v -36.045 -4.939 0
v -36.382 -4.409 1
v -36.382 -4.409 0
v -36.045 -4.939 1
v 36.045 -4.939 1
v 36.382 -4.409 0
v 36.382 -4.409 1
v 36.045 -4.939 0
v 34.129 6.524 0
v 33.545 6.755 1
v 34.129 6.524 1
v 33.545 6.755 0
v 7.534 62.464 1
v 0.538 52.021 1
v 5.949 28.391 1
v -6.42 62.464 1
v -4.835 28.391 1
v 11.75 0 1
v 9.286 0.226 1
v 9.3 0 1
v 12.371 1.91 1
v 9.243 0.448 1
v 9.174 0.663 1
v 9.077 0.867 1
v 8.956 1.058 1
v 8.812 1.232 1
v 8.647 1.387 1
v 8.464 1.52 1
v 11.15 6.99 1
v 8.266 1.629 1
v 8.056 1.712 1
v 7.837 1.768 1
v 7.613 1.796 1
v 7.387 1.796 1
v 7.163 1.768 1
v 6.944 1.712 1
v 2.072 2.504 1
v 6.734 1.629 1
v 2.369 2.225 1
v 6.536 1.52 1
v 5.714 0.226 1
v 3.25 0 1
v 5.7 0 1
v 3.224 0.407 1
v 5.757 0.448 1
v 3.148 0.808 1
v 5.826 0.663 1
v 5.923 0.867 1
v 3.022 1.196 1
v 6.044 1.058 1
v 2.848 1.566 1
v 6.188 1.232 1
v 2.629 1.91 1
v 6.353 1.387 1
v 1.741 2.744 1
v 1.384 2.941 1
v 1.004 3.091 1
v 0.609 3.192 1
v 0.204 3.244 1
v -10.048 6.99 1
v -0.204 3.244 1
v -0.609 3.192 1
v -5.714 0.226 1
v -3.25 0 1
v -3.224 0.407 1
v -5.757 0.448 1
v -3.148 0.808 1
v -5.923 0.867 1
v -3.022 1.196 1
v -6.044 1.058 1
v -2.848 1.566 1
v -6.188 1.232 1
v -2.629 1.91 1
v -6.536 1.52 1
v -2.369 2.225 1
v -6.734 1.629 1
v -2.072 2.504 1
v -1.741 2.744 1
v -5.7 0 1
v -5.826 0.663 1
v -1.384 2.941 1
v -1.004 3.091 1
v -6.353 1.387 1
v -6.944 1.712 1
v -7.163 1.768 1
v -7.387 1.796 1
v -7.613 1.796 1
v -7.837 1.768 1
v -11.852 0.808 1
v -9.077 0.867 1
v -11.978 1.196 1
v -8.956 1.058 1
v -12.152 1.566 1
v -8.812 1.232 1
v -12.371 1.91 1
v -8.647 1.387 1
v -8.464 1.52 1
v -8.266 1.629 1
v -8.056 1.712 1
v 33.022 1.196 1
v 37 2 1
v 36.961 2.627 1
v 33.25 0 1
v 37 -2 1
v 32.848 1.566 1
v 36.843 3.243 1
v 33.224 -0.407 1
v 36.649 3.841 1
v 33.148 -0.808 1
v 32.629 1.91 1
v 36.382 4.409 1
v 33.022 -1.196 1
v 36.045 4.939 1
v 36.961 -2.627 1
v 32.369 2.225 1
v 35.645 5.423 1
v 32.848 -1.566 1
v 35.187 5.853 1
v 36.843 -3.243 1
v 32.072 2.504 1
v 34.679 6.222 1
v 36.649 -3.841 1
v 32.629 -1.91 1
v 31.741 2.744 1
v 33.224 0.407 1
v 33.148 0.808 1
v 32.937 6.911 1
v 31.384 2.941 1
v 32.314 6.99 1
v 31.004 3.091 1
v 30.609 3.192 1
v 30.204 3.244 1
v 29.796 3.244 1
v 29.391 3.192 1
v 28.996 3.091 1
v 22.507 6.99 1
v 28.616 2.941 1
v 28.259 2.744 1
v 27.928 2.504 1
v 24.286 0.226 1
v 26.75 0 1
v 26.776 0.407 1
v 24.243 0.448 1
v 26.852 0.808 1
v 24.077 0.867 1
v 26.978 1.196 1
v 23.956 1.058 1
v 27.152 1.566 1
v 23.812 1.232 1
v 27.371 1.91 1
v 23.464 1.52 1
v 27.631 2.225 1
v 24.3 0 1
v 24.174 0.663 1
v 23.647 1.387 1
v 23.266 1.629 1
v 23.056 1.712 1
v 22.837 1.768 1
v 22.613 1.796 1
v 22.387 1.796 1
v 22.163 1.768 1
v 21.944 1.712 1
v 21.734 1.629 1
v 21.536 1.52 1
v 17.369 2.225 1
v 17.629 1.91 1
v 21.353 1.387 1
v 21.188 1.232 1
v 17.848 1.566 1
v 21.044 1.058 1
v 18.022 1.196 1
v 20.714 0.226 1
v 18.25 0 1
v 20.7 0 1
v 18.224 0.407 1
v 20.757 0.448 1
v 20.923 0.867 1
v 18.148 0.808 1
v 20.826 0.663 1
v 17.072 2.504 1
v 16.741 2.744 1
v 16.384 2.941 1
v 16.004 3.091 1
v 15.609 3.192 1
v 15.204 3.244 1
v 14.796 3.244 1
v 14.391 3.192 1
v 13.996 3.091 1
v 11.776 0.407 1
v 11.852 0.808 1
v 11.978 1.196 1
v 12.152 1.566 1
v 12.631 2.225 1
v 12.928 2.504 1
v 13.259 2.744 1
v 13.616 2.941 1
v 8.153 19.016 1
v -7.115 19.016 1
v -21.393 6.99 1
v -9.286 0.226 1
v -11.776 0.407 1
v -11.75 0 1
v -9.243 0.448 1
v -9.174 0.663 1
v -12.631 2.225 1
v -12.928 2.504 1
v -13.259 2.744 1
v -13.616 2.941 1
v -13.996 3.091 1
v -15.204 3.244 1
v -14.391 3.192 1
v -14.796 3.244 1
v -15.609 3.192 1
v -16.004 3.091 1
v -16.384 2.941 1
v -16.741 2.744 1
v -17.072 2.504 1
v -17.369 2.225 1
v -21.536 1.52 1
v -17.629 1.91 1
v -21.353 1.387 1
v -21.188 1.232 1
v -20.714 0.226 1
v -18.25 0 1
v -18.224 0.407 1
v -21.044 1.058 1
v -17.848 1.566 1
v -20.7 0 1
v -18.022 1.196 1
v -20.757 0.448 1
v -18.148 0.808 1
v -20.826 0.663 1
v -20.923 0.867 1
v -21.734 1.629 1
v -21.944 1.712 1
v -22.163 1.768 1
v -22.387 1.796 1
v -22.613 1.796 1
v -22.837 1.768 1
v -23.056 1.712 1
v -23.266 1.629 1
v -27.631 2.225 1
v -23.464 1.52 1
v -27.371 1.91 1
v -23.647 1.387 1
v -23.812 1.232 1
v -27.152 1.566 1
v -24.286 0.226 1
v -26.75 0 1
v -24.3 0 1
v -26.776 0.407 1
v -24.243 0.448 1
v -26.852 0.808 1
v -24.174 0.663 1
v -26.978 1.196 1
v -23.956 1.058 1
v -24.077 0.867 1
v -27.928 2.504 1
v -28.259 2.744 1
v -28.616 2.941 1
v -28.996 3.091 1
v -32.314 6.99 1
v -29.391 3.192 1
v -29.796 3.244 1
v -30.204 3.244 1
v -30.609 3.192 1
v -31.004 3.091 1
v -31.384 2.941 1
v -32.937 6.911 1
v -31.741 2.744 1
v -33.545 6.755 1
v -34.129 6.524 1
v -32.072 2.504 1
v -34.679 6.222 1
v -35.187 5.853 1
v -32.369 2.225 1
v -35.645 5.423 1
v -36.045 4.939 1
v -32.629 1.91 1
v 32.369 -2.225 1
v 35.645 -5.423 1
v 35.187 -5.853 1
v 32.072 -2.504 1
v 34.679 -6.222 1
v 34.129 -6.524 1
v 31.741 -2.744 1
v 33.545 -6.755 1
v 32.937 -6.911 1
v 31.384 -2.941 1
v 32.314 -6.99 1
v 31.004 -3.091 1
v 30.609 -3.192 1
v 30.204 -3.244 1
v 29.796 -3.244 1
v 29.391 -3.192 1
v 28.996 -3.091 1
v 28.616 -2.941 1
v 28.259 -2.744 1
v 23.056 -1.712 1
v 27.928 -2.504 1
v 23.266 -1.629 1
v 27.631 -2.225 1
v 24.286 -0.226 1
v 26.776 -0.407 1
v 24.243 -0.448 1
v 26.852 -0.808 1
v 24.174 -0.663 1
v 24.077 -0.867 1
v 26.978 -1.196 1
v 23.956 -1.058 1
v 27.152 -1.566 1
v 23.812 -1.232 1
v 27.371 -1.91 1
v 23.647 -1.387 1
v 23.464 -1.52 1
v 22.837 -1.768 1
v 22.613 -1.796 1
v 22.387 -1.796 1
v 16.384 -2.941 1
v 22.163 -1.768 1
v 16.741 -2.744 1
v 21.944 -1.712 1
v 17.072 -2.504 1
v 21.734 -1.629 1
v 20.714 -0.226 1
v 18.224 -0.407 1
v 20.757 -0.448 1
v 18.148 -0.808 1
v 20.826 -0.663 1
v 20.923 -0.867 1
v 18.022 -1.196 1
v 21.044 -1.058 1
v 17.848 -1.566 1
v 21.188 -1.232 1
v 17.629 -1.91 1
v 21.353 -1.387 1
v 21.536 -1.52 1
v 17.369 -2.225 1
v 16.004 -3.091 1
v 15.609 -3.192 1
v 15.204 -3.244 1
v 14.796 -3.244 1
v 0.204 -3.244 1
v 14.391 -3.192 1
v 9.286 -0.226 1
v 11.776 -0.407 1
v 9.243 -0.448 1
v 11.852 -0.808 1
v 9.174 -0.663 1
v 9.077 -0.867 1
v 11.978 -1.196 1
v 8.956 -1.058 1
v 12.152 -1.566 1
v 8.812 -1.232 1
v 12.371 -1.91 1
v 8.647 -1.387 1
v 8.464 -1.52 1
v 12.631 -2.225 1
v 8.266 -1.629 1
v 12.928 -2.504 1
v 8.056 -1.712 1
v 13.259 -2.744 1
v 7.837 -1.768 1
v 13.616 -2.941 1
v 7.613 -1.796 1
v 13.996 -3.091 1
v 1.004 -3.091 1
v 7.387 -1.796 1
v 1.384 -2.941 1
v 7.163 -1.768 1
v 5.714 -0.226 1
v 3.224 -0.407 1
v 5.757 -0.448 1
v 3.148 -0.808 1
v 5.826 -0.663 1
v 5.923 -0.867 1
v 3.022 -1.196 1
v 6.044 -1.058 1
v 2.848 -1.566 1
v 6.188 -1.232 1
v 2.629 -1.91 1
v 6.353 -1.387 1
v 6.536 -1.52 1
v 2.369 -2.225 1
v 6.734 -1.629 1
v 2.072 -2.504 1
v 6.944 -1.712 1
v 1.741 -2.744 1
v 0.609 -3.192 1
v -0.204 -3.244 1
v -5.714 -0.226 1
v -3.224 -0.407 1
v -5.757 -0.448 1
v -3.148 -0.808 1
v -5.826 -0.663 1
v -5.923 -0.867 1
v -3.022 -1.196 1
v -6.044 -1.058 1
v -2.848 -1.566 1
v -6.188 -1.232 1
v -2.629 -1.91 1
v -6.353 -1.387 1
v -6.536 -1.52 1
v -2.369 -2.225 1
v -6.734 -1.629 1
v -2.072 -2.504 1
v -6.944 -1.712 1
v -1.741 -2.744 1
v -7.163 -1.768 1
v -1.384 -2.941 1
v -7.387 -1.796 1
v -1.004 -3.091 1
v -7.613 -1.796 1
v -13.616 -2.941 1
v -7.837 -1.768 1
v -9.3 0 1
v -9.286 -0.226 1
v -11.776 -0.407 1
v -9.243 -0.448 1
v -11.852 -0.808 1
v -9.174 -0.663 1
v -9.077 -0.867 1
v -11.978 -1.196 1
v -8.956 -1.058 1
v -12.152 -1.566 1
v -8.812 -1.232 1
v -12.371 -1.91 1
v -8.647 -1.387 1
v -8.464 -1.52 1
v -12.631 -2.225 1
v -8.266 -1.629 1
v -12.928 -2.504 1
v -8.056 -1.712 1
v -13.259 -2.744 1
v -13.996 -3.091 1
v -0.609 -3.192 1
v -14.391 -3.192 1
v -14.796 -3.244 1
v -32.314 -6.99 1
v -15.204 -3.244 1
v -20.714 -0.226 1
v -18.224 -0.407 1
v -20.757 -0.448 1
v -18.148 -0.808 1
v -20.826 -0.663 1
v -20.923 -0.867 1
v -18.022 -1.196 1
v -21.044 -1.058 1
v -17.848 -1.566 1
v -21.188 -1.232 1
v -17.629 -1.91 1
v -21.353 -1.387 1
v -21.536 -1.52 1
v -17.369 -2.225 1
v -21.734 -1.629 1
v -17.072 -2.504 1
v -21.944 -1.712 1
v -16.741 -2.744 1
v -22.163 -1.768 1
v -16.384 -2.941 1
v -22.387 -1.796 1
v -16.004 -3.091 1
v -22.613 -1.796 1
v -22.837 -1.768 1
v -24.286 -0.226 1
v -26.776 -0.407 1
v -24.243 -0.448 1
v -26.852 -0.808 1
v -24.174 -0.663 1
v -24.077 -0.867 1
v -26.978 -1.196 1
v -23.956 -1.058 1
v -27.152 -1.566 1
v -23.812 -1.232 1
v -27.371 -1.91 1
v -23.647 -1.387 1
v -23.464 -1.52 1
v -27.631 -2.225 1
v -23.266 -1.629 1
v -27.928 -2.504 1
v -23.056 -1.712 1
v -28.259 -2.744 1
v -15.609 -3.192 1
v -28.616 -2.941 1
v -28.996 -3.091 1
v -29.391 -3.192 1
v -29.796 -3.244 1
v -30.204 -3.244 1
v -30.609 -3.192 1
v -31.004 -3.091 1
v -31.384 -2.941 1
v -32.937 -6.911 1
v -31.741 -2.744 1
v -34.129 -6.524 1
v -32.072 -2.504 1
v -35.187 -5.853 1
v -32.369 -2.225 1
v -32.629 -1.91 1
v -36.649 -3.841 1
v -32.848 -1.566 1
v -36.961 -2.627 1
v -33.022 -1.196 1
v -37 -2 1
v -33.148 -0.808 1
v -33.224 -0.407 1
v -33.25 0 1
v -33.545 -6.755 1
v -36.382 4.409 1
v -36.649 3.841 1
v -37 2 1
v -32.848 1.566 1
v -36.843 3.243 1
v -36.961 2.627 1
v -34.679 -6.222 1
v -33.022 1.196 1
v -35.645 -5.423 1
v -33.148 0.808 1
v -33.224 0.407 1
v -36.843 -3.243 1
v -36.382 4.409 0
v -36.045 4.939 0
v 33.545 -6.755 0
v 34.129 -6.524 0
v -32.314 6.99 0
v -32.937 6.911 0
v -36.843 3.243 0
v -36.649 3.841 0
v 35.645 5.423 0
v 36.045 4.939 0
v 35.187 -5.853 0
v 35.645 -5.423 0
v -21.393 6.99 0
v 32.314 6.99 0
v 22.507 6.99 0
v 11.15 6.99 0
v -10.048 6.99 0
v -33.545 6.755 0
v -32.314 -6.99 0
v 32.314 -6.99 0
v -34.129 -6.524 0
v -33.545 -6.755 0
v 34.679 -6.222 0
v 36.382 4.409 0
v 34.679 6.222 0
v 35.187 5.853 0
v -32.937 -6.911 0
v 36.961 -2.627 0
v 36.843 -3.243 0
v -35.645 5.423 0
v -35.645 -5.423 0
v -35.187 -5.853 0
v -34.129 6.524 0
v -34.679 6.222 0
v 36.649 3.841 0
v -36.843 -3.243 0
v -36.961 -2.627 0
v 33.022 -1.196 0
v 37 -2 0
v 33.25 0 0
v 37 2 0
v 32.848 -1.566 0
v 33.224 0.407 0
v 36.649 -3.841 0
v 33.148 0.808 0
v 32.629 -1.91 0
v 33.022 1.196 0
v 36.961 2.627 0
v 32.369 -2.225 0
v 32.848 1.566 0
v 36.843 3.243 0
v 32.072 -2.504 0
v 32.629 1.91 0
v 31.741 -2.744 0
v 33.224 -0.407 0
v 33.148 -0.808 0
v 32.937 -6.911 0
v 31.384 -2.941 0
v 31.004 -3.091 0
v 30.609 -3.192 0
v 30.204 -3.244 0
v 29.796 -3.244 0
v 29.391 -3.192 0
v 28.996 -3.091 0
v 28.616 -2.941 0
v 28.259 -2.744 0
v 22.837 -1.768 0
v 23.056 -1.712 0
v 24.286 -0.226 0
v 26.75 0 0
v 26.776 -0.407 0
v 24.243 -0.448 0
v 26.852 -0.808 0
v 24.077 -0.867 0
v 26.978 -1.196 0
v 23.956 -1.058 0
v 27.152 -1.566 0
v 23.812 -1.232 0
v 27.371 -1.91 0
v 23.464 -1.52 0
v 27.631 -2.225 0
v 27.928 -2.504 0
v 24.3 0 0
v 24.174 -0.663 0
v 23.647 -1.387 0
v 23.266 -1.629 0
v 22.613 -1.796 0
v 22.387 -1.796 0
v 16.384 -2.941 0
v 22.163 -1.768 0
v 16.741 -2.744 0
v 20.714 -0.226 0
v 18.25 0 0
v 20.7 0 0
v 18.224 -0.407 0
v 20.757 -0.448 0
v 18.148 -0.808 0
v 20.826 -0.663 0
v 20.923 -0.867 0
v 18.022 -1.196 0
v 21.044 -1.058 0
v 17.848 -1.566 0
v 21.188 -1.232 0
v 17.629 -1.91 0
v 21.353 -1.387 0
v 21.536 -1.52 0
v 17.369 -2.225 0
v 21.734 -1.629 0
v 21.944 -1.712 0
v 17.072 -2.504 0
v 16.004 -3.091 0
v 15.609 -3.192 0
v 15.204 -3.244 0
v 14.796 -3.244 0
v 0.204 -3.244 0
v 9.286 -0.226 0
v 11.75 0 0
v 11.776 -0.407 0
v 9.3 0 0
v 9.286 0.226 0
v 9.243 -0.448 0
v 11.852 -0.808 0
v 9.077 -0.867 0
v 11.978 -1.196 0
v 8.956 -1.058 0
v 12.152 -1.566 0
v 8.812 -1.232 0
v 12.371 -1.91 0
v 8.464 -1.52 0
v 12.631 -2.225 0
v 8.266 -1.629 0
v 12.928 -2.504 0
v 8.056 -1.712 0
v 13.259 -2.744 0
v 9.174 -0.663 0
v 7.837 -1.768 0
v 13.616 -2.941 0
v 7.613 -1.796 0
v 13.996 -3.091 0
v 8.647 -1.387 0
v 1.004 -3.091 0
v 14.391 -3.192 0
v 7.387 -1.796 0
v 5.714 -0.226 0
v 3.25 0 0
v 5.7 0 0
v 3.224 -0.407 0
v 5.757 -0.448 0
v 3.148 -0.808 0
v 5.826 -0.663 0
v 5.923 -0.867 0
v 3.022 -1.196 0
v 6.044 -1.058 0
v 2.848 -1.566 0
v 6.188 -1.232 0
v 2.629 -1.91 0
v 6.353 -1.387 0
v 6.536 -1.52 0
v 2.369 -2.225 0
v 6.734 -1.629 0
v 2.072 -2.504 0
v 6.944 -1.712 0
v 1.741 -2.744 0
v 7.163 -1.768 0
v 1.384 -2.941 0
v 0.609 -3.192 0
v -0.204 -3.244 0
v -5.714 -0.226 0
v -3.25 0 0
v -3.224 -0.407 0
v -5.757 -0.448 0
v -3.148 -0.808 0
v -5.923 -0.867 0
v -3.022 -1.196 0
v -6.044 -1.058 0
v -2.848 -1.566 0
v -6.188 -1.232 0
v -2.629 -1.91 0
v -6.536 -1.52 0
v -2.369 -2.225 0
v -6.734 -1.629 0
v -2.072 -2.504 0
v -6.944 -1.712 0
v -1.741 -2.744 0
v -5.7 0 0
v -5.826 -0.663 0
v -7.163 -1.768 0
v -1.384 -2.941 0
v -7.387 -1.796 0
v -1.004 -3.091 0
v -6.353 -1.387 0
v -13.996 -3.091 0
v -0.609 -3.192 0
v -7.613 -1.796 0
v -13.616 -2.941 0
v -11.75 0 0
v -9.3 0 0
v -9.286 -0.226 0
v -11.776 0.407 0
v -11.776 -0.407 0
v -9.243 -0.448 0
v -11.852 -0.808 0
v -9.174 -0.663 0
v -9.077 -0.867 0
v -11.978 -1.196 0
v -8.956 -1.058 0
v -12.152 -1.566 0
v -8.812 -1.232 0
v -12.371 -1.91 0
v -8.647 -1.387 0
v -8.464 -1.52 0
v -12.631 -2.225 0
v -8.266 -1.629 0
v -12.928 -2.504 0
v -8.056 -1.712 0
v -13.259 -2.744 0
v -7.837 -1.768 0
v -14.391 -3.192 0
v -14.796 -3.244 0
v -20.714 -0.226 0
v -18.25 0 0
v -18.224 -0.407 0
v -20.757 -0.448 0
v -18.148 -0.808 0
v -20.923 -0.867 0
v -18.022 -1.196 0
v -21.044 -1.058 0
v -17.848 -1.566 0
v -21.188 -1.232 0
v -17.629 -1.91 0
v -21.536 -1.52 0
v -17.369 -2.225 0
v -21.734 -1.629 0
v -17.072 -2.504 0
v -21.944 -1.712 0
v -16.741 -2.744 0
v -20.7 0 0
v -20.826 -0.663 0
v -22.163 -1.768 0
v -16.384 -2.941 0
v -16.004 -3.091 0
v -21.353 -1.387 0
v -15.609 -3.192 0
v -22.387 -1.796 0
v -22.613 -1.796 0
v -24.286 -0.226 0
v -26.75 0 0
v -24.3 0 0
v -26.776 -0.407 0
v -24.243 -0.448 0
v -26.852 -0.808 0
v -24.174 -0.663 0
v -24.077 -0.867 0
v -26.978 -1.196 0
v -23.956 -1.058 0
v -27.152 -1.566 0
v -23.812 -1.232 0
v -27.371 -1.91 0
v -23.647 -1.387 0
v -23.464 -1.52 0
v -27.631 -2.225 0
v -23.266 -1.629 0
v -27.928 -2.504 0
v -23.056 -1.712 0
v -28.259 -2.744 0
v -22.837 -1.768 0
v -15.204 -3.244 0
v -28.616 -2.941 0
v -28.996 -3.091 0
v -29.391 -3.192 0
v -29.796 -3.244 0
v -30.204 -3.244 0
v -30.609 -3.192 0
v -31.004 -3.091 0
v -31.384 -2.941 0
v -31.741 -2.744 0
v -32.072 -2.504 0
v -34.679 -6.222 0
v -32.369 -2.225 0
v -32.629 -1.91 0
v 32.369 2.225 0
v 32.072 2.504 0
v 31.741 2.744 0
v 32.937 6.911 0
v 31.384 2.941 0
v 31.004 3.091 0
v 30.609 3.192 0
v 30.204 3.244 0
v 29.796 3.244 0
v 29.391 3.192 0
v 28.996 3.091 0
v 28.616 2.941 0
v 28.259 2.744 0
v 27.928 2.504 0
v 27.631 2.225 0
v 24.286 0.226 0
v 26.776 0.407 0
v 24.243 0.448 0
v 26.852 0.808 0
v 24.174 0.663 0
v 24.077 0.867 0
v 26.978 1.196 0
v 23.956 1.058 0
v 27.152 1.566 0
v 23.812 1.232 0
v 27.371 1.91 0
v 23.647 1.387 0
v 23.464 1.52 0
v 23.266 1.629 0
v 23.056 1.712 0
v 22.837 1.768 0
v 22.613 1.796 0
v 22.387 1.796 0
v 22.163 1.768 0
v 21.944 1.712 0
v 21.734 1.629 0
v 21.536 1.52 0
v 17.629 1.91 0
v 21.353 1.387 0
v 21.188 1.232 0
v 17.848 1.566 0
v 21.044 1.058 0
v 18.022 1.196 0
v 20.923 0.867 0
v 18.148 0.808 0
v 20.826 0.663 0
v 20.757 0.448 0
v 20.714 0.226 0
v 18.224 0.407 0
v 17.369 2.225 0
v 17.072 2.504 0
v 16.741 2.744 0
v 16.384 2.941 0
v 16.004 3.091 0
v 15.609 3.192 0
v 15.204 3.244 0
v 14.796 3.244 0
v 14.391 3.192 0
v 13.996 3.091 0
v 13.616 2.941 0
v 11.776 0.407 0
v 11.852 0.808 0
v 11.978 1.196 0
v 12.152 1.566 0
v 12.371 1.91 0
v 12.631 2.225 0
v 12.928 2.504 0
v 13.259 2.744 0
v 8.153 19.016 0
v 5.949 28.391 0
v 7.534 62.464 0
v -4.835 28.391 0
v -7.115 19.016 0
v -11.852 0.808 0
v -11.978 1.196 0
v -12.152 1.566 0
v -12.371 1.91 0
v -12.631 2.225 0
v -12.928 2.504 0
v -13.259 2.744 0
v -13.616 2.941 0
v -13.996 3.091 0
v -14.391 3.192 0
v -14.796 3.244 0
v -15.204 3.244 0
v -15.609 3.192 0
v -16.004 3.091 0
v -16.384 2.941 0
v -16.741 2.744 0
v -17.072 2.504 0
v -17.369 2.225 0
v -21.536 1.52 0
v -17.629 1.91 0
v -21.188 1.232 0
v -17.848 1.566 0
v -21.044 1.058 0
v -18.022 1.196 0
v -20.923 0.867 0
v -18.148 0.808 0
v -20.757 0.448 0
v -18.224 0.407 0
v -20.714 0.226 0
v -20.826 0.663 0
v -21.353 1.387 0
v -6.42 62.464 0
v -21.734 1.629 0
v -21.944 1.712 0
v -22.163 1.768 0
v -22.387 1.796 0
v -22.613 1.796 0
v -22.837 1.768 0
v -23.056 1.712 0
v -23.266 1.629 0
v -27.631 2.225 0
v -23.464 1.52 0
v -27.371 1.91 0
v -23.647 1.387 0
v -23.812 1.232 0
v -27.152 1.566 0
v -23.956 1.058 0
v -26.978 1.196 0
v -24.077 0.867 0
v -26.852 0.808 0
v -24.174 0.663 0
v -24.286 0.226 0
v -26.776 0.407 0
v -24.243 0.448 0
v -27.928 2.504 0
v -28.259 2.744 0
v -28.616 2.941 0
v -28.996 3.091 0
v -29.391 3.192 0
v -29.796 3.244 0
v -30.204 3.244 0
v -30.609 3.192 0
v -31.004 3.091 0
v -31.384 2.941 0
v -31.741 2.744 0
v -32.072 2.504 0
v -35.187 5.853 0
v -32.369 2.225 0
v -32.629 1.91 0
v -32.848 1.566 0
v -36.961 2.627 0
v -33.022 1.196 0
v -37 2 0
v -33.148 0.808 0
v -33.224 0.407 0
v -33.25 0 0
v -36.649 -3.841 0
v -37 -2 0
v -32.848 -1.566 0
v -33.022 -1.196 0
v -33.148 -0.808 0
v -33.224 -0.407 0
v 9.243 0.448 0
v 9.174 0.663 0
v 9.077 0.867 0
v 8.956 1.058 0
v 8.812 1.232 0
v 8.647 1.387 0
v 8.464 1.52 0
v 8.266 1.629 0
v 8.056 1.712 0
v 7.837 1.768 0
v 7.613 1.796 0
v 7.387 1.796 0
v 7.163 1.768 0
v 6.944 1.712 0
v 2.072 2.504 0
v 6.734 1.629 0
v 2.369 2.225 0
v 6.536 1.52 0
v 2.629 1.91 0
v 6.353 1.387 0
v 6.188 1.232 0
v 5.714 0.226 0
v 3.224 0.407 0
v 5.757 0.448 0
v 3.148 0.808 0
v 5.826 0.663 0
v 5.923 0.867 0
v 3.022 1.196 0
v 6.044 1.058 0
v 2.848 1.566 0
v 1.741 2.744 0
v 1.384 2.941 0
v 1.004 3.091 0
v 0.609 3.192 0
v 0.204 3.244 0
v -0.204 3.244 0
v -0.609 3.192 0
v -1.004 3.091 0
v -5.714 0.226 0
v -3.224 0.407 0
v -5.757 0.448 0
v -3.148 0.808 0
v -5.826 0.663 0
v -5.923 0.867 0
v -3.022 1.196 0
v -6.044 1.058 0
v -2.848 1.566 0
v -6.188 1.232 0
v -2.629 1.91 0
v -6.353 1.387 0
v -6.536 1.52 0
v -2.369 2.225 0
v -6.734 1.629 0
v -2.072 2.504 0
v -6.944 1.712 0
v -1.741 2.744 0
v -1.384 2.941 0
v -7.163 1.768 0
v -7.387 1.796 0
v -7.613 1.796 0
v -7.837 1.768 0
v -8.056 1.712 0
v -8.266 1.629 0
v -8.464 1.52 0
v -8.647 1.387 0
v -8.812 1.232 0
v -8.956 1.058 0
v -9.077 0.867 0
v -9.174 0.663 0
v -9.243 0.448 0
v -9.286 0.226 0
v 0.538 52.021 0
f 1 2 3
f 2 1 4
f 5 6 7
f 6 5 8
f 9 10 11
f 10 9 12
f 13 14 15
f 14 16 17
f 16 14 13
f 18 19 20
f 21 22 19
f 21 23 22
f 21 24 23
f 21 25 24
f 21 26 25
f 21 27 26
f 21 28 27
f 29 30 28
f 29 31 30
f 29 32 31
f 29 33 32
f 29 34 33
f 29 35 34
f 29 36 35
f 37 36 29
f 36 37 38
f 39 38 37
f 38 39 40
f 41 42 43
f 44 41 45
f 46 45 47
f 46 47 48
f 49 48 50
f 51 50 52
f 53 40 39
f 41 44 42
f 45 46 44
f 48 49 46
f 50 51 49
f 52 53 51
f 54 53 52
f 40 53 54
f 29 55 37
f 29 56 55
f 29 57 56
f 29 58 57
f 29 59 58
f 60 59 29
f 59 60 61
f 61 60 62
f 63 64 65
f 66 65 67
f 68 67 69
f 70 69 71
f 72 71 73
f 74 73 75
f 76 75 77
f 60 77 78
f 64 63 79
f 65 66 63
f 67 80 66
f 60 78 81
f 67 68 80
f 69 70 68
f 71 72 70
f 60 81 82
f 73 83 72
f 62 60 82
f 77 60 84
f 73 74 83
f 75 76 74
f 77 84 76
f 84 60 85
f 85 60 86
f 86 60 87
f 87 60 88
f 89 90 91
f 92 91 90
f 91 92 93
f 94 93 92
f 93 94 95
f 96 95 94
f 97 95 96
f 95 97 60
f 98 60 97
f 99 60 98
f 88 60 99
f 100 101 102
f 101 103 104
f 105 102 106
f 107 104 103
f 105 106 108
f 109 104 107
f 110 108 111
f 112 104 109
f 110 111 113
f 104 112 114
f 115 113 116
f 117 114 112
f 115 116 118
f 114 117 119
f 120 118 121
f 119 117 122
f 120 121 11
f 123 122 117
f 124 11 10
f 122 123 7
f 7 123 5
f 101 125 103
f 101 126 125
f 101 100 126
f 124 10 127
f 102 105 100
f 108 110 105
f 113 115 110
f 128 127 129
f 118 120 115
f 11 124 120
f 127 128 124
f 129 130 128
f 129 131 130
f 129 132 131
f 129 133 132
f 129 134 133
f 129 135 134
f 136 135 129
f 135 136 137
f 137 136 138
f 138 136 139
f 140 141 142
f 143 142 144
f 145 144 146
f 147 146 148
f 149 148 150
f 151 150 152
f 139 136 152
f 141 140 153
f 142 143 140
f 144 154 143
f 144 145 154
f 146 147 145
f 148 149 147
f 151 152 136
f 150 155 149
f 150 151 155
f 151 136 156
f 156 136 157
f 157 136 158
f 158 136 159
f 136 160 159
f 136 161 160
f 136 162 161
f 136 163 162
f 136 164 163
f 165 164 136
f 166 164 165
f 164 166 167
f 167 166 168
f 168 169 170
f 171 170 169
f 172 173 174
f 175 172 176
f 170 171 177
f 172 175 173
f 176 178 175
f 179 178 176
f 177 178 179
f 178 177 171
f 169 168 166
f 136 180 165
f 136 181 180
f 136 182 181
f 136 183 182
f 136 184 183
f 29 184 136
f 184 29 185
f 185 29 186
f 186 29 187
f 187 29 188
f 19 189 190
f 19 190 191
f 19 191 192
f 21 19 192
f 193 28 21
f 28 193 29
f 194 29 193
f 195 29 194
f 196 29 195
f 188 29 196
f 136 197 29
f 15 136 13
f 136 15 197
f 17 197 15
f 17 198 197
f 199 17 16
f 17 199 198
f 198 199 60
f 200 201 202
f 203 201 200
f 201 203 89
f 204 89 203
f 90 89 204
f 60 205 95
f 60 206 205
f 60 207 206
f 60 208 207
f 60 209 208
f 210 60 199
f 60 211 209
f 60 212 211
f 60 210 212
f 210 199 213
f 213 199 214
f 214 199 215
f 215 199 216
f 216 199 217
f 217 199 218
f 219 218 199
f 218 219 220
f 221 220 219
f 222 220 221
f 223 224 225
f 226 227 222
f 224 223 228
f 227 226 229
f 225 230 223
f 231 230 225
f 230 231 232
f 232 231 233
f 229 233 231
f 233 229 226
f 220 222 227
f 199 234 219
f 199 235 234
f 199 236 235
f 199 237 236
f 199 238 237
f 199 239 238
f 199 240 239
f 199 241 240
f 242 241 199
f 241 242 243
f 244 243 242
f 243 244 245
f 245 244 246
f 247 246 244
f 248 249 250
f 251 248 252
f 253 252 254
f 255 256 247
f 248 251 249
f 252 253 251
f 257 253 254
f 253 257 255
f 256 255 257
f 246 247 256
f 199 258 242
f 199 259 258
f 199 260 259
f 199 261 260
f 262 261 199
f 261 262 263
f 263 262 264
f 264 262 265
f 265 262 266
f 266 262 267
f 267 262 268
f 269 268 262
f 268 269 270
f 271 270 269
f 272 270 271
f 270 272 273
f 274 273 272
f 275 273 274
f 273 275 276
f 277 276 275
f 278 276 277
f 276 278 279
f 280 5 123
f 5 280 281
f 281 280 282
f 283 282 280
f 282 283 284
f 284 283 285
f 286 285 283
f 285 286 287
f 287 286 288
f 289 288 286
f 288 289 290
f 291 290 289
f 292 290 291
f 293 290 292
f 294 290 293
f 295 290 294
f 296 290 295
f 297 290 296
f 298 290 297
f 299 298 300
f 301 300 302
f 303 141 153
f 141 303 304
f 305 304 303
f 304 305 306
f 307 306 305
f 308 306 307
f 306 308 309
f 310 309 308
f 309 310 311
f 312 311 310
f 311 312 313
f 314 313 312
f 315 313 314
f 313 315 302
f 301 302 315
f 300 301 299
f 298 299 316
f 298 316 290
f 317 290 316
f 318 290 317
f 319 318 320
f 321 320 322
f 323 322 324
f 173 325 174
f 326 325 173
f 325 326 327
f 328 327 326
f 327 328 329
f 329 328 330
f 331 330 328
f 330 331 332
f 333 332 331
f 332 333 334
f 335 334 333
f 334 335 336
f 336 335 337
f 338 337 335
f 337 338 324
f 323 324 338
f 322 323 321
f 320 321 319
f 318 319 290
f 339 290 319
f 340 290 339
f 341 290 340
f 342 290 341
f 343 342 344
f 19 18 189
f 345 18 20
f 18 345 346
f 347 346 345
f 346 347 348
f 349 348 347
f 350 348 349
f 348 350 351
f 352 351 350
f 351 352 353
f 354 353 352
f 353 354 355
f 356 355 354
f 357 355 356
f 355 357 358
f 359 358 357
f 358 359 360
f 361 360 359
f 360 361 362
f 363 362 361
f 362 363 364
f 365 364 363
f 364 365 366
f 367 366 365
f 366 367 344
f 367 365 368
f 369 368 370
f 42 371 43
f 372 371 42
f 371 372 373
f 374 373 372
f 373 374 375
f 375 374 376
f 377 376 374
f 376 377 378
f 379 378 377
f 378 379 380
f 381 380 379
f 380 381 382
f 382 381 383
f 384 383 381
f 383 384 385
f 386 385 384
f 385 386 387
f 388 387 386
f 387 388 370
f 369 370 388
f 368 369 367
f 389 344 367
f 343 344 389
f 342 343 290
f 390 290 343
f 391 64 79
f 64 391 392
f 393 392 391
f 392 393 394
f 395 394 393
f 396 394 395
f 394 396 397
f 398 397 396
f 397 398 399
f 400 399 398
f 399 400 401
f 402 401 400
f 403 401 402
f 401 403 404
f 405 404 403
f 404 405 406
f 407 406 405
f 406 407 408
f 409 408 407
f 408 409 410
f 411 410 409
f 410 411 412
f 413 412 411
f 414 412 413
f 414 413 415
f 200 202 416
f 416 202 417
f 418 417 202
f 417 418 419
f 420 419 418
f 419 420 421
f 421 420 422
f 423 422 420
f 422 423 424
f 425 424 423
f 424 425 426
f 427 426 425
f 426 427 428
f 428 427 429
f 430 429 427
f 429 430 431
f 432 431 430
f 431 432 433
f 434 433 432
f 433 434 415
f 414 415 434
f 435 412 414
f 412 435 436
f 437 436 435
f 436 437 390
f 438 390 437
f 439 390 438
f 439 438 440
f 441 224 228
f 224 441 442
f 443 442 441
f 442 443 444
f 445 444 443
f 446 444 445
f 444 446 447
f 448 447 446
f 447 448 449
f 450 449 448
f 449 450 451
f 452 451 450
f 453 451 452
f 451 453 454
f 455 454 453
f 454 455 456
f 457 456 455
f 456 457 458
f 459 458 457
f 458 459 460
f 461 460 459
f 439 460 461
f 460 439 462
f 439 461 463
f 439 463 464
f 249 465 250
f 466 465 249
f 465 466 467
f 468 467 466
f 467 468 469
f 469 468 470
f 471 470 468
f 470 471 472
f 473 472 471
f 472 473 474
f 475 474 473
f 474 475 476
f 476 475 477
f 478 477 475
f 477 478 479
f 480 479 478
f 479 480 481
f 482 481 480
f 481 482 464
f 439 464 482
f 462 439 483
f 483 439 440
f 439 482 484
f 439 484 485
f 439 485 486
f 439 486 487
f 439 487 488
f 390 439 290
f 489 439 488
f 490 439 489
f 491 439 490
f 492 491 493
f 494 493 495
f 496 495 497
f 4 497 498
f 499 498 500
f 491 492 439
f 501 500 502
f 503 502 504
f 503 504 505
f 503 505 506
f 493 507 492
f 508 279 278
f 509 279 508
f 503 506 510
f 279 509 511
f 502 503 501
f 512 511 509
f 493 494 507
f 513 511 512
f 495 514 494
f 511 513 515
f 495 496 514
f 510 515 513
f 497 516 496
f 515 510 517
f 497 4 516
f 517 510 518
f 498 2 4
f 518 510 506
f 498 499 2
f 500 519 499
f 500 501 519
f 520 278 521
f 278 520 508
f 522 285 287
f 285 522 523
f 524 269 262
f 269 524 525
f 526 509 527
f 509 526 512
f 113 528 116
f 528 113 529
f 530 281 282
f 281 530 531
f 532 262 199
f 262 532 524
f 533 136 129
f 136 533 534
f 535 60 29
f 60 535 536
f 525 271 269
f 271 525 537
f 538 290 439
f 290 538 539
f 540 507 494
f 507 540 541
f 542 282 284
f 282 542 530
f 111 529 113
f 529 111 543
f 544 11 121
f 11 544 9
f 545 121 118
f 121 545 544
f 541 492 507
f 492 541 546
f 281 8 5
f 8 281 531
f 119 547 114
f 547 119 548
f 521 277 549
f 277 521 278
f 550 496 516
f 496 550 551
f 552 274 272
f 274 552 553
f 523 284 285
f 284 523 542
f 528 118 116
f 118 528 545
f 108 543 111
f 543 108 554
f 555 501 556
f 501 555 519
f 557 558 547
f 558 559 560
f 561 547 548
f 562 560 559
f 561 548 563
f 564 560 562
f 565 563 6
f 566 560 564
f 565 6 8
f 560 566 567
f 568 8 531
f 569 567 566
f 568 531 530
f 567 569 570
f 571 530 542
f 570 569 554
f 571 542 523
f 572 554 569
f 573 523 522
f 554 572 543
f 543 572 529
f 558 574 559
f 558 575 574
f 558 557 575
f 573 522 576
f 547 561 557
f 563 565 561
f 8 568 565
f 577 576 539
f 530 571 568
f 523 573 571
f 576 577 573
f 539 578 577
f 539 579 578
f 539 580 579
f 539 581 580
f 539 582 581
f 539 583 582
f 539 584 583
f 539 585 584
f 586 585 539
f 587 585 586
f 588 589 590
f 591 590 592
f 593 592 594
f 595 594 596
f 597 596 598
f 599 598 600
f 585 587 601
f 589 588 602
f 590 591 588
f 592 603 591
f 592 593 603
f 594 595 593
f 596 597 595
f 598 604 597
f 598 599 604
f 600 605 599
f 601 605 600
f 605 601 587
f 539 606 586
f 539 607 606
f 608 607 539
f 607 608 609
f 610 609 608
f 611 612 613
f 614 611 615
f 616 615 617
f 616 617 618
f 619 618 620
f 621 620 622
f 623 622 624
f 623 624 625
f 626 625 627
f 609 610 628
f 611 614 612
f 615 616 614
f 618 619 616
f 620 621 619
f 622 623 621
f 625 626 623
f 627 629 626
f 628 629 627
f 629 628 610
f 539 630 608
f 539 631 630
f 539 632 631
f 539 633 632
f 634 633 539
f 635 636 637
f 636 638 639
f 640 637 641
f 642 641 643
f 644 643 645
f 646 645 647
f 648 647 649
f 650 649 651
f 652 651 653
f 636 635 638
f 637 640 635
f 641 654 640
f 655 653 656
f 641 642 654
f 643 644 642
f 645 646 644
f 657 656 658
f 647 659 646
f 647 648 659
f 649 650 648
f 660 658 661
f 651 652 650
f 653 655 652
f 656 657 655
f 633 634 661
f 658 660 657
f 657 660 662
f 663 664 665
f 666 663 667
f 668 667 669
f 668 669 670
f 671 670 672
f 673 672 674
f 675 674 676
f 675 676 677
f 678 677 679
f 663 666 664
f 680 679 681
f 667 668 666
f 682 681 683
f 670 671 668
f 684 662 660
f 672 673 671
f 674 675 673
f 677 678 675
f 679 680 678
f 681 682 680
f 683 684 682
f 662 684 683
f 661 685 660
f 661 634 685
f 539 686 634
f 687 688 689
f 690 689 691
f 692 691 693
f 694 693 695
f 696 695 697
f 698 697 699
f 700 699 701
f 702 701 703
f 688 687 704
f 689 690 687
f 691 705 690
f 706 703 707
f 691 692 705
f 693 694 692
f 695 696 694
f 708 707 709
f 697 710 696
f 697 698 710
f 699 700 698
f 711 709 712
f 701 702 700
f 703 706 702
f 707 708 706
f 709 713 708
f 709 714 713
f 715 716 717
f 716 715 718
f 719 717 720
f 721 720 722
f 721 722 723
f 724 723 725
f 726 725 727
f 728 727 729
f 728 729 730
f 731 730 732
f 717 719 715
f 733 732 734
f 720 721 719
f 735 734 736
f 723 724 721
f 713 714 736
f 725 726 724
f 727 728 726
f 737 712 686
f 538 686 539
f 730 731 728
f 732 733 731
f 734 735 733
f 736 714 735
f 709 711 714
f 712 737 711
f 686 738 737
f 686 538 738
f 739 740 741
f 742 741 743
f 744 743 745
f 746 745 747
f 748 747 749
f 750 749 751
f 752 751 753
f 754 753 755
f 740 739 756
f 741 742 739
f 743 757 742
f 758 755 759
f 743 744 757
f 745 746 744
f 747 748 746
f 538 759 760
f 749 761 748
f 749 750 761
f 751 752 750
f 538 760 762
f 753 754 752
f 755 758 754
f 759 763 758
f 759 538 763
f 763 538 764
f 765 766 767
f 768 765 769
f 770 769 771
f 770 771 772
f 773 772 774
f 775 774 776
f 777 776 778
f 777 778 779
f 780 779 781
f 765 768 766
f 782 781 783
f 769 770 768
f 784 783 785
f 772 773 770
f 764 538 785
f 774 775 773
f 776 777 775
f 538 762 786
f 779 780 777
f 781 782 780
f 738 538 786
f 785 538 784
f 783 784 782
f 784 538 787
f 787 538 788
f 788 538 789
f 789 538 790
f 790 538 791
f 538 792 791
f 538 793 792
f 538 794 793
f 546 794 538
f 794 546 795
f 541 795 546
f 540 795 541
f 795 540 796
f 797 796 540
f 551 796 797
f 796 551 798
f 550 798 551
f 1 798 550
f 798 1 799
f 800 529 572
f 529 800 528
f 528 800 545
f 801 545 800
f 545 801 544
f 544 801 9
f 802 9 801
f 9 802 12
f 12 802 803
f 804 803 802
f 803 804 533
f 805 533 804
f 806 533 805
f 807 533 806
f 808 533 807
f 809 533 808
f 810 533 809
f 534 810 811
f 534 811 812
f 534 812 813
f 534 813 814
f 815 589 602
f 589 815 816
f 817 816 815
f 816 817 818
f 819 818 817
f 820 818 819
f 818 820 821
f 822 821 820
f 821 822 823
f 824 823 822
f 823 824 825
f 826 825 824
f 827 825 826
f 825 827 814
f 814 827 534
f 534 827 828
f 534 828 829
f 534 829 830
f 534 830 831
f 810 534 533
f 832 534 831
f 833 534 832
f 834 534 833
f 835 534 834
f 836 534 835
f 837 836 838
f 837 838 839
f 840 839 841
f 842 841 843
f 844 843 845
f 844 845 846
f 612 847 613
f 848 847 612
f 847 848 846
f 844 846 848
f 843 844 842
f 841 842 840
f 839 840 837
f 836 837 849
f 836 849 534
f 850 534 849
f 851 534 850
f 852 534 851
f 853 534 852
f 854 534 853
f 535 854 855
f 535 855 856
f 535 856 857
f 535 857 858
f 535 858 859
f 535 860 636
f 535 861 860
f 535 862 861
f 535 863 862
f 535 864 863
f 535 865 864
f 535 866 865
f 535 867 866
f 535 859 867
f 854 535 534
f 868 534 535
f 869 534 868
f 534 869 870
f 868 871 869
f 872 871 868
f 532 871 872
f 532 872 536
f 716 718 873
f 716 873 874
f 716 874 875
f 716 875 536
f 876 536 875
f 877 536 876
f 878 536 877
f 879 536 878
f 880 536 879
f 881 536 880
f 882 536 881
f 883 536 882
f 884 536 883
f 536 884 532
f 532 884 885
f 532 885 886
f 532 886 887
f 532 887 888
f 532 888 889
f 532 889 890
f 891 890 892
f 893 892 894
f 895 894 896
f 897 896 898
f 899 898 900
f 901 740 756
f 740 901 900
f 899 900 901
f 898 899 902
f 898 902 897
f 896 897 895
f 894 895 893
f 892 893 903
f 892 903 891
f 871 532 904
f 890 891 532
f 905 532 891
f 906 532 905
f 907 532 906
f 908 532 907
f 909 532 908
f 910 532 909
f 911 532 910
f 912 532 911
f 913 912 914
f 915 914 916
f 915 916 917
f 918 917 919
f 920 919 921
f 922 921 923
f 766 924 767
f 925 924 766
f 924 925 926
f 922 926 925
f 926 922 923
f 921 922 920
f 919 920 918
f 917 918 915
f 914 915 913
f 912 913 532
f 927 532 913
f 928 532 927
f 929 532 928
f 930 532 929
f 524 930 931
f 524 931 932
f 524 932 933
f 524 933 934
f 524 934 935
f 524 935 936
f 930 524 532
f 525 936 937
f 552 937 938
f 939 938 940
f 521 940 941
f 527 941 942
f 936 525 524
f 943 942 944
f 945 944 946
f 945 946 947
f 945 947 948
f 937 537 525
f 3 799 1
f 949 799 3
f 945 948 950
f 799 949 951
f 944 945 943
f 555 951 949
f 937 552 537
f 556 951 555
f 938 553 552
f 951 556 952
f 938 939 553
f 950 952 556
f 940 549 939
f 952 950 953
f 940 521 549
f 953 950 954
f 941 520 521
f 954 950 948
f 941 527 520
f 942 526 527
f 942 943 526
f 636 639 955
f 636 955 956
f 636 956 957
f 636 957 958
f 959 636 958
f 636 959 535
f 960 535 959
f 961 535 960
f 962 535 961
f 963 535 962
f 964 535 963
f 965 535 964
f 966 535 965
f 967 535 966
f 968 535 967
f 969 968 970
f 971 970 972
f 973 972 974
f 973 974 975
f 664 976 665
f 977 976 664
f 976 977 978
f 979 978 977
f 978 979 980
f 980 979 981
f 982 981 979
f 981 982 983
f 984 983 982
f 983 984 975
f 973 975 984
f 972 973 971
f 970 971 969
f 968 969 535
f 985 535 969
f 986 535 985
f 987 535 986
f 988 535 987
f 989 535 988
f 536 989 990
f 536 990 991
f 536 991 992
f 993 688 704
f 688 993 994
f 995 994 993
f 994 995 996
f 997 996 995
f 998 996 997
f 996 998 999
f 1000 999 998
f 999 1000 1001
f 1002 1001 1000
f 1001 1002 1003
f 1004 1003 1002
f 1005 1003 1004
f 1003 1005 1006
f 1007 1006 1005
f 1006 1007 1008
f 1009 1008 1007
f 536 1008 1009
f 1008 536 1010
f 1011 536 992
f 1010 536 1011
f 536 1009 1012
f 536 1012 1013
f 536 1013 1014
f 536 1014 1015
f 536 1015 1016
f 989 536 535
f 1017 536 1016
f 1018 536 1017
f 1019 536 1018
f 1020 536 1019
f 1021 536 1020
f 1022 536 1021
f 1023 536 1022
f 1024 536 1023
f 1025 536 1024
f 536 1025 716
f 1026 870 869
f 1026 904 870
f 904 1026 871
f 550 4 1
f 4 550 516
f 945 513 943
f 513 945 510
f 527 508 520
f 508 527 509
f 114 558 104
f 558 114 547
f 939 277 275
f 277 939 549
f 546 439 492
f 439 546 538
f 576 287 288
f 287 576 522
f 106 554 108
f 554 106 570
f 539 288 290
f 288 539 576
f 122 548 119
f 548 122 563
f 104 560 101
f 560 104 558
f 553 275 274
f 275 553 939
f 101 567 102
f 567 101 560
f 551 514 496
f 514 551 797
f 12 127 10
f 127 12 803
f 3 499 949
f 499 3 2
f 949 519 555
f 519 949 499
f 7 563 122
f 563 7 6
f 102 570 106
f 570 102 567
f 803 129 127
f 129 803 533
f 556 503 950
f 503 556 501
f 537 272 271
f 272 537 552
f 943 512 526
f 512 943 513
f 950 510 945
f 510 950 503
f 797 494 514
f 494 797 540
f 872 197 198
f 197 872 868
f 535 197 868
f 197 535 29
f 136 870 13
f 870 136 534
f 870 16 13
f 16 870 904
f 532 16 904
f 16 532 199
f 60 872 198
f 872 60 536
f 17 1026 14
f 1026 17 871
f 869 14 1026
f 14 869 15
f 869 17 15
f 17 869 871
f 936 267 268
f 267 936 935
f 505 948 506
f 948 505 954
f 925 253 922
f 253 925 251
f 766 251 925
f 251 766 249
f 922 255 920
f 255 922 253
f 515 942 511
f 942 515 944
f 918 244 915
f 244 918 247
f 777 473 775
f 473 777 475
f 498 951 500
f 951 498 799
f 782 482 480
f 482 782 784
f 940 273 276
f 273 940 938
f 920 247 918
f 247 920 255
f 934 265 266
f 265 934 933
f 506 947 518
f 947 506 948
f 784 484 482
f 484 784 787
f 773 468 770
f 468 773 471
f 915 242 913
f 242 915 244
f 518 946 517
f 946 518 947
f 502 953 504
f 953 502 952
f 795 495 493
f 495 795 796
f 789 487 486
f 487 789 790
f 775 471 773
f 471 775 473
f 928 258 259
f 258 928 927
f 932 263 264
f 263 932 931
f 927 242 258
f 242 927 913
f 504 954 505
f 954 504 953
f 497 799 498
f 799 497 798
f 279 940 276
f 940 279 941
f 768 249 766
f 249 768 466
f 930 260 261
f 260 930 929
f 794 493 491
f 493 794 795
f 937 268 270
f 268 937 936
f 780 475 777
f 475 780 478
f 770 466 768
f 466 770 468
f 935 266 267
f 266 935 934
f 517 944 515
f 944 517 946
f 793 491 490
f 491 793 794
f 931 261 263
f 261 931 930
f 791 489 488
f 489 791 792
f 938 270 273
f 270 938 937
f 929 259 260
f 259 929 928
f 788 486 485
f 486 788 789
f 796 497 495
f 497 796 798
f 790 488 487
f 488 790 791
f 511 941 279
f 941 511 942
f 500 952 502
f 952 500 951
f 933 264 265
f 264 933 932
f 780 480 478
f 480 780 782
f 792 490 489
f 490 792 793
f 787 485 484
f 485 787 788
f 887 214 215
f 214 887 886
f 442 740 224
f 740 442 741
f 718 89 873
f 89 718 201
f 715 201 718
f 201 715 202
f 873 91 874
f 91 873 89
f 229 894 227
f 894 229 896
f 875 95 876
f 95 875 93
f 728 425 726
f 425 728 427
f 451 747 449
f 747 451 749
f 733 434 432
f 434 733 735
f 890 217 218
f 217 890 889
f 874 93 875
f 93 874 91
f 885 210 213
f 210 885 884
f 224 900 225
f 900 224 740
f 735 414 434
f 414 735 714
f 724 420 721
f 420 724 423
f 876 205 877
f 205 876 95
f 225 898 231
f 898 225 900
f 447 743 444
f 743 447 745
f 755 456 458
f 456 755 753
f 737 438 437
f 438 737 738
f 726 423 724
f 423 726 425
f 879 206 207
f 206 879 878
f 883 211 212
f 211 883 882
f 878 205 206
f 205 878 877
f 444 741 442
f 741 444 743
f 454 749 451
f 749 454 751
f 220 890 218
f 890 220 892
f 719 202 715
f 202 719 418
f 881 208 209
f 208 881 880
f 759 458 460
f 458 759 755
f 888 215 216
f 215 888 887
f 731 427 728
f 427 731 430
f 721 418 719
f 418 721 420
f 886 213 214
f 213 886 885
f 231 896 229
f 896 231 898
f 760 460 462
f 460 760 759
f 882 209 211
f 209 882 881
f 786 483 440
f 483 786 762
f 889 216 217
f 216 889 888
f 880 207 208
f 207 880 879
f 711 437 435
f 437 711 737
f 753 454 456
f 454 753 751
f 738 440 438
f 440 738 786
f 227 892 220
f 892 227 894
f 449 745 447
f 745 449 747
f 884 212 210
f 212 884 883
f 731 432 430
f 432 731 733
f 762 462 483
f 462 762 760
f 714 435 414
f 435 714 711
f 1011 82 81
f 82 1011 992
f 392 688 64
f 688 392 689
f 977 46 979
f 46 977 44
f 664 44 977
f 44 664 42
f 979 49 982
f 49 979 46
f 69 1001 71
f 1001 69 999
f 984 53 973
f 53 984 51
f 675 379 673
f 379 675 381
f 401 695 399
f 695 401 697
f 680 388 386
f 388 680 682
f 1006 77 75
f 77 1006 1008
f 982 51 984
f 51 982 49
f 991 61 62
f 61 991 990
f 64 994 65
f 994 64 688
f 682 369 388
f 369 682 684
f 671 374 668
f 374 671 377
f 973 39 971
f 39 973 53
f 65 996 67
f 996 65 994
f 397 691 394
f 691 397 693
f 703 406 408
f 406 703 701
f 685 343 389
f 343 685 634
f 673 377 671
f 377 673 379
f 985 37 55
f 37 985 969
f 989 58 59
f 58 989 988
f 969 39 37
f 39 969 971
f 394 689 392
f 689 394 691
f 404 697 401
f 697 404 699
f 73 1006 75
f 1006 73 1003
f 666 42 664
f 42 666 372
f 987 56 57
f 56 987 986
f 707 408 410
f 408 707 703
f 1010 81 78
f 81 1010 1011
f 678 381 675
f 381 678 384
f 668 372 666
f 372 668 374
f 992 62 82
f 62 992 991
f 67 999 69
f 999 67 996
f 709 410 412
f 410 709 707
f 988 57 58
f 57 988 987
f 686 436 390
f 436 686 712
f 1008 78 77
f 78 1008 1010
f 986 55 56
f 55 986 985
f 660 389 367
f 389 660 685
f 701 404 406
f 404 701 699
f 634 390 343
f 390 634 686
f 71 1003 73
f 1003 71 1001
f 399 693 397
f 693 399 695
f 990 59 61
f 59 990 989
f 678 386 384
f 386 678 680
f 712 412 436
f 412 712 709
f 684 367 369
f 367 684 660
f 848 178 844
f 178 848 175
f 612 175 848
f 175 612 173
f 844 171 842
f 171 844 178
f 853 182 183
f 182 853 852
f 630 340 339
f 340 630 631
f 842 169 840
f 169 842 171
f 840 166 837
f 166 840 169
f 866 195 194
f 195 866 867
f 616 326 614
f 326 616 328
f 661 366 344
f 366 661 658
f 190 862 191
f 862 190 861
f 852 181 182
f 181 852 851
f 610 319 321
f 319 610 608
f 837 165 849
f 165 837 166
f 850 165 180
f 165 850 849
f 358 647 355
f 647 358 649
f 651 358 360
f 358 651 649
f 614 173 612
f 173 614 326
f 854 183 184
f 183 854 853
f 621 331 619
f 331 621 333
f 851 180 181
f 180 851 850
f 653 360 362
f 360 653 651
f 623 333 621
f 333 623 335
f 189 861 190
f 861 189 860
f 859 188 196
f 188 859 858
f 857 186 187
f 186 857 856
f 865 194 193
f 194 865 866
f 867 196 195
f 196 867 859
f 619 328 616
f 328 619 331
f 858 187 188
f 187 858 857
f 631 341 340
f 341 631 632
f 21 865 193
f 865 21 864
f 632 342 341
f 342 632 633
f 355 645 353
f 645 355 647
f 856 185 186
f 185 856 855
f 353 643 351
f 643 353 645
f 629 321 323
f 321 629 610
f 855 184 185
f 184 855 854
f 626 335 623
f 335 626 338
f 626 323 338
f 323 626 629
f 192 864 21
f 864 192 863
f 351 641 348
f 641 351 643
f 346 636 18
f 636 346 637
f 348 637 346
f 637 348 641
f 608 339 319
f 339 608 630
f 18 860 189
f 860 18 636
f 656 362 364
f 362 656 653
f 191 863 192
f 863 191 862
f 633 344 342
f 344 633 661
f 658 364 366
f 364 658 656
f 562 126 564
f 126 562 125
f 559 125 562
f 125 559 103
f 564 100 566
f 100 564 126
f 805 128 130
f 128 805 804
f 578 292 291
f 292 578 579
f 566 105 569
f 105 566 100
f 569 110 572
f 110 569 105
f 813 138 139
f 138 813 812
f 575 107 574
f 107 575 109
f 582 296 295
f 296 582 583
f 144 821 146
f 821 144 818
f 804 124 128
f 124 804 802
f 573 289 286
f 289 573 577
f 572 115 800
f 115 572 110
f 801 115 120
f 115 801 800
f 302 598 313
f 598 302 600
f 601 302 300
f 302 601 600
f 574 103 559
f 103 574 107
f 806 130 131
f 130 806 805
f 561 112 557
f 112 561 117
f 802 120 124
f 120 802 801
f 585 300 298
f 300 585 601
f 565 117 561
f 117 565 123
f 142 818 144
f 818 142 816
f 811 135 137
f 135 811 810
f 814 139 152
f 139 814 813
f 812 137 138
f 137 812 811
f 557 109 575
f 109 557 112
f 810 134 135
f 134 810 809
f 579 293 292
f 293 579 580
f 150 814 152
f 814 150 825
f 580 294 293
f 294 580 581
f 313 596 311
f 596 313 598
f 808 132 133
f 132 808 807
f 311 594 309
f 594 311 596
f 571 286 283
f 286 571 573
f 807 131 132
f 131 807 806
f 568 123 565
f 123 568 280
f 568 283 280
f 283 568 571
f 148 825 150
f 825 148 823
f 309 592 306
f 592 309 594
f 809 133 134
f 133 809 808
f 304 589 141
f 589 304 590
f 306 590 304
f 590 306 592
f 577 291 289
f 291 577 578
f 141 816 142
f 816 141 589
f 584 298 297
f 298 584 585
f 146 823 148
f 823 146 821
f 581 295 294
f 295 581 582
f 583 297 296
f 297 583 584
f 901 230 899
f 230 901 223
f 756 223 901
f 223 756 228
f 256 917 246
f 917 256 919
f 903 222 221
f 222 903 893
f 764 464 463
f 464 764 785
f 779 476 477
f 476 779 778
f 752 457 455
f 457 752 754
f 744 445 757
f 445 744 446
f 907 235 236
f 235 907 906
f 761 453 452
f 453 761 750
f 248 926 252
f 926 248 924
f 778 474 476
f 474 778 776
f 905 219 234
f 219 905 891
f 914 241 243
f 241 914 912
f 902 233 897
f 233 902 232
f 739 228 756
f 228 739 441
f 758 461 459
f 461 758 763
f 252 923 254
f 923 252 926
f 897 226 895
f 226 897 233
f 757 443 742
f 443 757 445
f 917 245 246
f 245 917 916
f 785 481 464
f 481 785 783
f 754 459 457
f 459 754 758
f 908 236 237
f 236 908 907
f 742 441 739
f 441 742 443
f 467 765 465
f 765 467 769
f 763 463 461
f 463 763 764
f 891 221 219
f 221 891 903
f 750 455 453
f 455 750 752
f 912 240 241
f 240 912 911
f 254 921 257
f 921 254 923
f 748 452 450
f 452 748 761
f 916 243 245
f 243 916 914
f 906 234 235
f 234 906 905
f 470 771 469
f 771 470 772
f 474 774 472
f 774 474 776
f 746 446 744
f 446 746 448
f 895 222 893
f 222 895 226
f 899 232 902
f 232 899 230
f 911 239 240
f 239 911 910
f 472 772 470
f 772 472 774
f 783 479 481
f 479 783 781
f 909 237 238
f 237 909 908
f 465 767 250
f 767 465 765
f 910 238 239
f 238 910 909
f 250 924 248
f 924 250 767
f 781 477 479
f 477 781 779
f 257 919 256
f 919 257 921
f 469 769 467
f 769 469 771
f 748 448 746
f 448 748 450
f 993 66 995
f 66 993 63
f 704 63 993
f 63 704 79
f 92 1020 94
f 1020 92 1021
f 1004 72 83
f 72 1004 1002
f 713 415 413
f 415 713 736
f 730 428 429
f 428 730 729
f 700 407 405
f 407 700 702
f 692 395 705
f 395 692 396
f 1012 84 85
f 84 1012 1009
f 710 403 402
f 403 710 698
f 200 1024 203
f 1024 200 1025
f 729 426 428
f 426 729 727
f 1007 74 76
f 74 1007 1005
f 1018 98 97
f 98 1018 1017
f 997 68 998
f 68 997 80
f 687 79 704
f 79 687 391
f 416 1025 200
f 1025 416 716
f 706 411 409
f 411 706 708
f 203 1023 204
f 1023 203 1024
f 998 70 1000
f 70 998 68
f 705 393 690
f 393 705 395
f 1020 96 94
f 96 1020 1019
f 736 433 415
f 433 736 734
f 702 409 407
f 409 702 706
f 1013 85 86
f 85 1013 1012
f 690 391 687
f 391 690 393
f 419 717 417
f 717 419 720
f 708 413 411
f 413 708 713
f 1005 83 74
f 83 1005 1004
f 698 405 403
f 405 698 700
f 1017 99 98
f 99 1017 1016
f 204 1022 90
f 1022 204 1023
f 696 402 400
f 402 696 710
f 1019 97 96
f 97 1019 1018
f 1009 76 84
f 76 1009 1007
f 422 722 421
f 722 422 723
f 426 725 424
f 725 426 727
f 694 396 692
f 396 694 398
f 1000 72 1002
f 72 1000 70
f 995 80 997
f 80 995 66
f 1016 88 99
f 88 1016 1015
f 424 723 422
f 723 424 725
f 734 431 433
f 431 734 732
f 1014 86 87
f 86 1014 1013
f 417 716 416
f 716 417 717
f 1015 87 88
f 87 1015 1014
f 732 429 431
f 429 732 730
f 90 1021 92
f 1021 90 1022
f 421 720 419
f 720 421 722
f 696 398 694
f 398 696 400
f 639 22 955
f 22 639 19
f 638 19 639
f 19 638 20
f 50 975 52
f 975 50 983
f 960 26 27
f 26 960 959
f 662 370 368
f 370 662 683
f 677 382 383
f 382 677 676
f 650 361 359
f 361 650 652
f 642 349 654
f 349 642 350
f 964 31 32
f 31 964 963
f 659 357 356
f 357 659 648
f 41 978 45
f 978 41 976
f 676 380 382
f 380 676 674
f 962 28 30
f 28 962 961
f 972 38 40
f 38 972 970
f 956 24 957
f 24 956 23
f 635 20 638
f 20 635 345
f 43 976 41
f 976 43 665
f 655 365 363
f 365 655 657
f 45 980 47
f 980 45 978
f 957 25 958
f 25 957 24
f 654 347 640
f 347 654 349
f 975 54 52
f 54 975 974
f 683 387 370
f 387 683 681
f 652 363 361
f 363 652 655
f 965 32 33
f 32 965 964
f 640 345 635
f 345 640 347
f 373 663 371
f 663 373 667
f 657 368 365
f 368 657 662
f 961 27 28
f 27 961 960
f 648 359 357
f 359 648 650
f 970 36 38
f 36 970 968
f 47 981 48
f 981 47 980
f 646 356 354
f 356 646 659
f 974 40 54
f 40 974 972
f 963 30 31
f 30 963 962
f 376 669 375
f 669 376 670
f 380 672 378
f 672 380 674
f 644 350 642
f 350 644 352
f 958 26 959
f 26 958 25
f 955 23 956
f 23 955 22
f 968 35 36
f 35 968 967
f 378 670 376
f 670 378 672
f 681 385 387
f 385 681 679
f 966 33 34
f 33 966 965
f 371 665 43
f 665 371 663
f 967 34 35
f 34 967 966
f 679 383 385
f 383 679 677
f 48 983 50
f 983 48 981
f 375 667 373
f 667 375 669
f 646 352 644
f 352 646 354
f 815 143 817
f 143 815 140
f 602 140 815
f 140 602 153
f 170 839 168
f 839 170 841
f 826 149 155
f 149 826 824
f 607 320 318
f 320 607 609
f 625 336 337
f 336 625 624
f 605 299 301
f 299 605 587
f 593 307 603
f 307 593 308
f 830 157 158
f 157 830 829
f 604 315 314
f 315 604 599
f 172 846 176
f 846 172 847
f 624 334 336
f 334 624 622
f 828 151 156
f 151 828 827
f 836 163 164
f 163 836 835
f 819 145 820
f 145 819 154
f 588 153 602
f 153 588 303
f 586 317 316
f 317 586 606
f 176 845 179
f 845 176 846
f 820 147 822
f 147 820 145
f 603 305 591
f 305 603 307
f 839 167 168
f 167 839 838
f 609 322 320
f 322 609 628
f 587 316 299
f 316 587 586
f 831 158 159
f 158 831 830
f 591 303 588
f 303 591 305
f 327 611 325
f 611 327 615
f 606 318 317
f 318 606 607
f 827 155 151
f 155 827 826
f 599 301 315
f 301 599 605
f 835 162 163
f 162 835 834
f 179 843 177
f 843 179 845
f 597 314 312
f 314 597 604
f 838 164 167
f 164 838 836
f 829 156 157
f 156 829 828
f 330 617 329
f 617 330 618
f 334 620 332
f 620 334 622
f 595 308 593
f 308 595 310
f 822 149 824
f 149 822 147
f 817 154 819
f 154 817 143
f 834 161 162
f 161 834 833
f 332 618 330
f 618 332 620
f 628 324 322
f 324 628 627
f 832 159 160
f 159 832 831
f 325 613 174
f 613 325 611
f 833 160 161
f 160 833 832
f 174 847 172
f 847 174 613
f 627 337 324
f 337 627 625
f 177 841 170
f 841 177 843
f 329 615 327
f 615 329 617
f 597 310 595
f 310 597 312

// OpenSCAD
$fn = 50;


difference() {
	union() {
		hull() {
			translate(v = [-32.0000000000, 2.0000000000, 0]) {
				cylinder(h = 1, r = 5);
			}
			translate(v = [32.0000000000, 2.0000000000, 0]) {
				cylinder(h = 1, r = 5);
			}
			translate(v = [-32.0000000000, -2.0000000000, 0]) {
				cylinder(h = 1, r = 5);
			}
			translate(v = [32.0000000000, -2.0000000000, 0]) {
				cylinder(h = 1, r = 5);
			}
		}
		translate(v = [0, 61.1111111111, 0]) {
			linear_extrude(height = 1) {
				text(font = "DejaVu Sans Mono:style=Bold", halign = "center", size = 57.0000000000, text = "A", valign = "top");
			}
		}
	}
	union() {
		translate(v = [-30.0000000000, 0.0000000000, 0]) {
			translate(v = [0, 0, -100]) {
				cylinder(h = 200, r = 3.2500000000);
			}
		}
		translate(v = [-15.0000000000, 0.0000000000, 0]) {
			translate(v = [0, 0, -100]) {
				cylinder(h = 200, r = 3.2500000000);
			}
		}
		translate(v = [0, 0, -100]) {
			cylinder(h = 200, r = 3.2500000000);
		}
		translate(v = [15.0000000000, 0.0000000000, 0]) {
			translate(v = [0, 0, -100]) {
				cylinder(h = 200, r = 3.2500000000);
			}
		}
		translate(v = [30.0000000000, 0.0000000000, 0]) {
			translate(v = [0, 0, -100]) {
				cylinder(h = 200, r = 3.2500000000);
			}
		}
		translate(v = [-30.0000000000, 0.0000000000, 0]) {
			translate(v = [0, 0, -100]) {
				cylinder(h = 200, r = 1.8000000000);
			}
		}
		translate(v = [-22.5000000000, 0.0000000000, 0]) {
			translate(v = [0, 0, -100]) {
				cylinder(h = 200, r = 1.8000000000);
			}
		}
		translate(v = [-15.0000000000, 0.0000000000, 0]) {
			translate(v = [0, 0, -100]) {
				cylinder(h = 200, r = 1.8000000000);
			}
		}
		translate(v = [-7.5000000000, 0.0000000000, 0]) {
			translate(v = [0, 0, -100]) {
				cylinder(h = 200, r = 1.8000000000);
			}
		}
		translate(v = [0, 0, -100]) {
			cylinder(h = 200, r = 1.8000000000);
		}
		translate(v = [7.5000000000, 0.0000000000, 0]) {
			translate(v = [0, 0, -100]) {
				cylinder(h = 200, r = 1.8000000000);
			}
		}
		translate(v = [15.0000000000, 0.0000000000, 0]) {
			translate(v = [0, 0, -100]) {
				cylinder(h = 200, r = 1.8000000000);
			}
		}
		translate(v = [22.5000000000, 0.0000000000, 0]) {
			translate(v = [0, 0, -100]) {
				cylinder(h = 200, r = 1.8000000000);
			}
		}
		translate(v = [30.0000000000, 0.0000000000, 0]) {
			translate(v = [0, 0, -100]) {
				cylinder(h = 200, r = 1.8000000000);
			}
		}
	}
}
